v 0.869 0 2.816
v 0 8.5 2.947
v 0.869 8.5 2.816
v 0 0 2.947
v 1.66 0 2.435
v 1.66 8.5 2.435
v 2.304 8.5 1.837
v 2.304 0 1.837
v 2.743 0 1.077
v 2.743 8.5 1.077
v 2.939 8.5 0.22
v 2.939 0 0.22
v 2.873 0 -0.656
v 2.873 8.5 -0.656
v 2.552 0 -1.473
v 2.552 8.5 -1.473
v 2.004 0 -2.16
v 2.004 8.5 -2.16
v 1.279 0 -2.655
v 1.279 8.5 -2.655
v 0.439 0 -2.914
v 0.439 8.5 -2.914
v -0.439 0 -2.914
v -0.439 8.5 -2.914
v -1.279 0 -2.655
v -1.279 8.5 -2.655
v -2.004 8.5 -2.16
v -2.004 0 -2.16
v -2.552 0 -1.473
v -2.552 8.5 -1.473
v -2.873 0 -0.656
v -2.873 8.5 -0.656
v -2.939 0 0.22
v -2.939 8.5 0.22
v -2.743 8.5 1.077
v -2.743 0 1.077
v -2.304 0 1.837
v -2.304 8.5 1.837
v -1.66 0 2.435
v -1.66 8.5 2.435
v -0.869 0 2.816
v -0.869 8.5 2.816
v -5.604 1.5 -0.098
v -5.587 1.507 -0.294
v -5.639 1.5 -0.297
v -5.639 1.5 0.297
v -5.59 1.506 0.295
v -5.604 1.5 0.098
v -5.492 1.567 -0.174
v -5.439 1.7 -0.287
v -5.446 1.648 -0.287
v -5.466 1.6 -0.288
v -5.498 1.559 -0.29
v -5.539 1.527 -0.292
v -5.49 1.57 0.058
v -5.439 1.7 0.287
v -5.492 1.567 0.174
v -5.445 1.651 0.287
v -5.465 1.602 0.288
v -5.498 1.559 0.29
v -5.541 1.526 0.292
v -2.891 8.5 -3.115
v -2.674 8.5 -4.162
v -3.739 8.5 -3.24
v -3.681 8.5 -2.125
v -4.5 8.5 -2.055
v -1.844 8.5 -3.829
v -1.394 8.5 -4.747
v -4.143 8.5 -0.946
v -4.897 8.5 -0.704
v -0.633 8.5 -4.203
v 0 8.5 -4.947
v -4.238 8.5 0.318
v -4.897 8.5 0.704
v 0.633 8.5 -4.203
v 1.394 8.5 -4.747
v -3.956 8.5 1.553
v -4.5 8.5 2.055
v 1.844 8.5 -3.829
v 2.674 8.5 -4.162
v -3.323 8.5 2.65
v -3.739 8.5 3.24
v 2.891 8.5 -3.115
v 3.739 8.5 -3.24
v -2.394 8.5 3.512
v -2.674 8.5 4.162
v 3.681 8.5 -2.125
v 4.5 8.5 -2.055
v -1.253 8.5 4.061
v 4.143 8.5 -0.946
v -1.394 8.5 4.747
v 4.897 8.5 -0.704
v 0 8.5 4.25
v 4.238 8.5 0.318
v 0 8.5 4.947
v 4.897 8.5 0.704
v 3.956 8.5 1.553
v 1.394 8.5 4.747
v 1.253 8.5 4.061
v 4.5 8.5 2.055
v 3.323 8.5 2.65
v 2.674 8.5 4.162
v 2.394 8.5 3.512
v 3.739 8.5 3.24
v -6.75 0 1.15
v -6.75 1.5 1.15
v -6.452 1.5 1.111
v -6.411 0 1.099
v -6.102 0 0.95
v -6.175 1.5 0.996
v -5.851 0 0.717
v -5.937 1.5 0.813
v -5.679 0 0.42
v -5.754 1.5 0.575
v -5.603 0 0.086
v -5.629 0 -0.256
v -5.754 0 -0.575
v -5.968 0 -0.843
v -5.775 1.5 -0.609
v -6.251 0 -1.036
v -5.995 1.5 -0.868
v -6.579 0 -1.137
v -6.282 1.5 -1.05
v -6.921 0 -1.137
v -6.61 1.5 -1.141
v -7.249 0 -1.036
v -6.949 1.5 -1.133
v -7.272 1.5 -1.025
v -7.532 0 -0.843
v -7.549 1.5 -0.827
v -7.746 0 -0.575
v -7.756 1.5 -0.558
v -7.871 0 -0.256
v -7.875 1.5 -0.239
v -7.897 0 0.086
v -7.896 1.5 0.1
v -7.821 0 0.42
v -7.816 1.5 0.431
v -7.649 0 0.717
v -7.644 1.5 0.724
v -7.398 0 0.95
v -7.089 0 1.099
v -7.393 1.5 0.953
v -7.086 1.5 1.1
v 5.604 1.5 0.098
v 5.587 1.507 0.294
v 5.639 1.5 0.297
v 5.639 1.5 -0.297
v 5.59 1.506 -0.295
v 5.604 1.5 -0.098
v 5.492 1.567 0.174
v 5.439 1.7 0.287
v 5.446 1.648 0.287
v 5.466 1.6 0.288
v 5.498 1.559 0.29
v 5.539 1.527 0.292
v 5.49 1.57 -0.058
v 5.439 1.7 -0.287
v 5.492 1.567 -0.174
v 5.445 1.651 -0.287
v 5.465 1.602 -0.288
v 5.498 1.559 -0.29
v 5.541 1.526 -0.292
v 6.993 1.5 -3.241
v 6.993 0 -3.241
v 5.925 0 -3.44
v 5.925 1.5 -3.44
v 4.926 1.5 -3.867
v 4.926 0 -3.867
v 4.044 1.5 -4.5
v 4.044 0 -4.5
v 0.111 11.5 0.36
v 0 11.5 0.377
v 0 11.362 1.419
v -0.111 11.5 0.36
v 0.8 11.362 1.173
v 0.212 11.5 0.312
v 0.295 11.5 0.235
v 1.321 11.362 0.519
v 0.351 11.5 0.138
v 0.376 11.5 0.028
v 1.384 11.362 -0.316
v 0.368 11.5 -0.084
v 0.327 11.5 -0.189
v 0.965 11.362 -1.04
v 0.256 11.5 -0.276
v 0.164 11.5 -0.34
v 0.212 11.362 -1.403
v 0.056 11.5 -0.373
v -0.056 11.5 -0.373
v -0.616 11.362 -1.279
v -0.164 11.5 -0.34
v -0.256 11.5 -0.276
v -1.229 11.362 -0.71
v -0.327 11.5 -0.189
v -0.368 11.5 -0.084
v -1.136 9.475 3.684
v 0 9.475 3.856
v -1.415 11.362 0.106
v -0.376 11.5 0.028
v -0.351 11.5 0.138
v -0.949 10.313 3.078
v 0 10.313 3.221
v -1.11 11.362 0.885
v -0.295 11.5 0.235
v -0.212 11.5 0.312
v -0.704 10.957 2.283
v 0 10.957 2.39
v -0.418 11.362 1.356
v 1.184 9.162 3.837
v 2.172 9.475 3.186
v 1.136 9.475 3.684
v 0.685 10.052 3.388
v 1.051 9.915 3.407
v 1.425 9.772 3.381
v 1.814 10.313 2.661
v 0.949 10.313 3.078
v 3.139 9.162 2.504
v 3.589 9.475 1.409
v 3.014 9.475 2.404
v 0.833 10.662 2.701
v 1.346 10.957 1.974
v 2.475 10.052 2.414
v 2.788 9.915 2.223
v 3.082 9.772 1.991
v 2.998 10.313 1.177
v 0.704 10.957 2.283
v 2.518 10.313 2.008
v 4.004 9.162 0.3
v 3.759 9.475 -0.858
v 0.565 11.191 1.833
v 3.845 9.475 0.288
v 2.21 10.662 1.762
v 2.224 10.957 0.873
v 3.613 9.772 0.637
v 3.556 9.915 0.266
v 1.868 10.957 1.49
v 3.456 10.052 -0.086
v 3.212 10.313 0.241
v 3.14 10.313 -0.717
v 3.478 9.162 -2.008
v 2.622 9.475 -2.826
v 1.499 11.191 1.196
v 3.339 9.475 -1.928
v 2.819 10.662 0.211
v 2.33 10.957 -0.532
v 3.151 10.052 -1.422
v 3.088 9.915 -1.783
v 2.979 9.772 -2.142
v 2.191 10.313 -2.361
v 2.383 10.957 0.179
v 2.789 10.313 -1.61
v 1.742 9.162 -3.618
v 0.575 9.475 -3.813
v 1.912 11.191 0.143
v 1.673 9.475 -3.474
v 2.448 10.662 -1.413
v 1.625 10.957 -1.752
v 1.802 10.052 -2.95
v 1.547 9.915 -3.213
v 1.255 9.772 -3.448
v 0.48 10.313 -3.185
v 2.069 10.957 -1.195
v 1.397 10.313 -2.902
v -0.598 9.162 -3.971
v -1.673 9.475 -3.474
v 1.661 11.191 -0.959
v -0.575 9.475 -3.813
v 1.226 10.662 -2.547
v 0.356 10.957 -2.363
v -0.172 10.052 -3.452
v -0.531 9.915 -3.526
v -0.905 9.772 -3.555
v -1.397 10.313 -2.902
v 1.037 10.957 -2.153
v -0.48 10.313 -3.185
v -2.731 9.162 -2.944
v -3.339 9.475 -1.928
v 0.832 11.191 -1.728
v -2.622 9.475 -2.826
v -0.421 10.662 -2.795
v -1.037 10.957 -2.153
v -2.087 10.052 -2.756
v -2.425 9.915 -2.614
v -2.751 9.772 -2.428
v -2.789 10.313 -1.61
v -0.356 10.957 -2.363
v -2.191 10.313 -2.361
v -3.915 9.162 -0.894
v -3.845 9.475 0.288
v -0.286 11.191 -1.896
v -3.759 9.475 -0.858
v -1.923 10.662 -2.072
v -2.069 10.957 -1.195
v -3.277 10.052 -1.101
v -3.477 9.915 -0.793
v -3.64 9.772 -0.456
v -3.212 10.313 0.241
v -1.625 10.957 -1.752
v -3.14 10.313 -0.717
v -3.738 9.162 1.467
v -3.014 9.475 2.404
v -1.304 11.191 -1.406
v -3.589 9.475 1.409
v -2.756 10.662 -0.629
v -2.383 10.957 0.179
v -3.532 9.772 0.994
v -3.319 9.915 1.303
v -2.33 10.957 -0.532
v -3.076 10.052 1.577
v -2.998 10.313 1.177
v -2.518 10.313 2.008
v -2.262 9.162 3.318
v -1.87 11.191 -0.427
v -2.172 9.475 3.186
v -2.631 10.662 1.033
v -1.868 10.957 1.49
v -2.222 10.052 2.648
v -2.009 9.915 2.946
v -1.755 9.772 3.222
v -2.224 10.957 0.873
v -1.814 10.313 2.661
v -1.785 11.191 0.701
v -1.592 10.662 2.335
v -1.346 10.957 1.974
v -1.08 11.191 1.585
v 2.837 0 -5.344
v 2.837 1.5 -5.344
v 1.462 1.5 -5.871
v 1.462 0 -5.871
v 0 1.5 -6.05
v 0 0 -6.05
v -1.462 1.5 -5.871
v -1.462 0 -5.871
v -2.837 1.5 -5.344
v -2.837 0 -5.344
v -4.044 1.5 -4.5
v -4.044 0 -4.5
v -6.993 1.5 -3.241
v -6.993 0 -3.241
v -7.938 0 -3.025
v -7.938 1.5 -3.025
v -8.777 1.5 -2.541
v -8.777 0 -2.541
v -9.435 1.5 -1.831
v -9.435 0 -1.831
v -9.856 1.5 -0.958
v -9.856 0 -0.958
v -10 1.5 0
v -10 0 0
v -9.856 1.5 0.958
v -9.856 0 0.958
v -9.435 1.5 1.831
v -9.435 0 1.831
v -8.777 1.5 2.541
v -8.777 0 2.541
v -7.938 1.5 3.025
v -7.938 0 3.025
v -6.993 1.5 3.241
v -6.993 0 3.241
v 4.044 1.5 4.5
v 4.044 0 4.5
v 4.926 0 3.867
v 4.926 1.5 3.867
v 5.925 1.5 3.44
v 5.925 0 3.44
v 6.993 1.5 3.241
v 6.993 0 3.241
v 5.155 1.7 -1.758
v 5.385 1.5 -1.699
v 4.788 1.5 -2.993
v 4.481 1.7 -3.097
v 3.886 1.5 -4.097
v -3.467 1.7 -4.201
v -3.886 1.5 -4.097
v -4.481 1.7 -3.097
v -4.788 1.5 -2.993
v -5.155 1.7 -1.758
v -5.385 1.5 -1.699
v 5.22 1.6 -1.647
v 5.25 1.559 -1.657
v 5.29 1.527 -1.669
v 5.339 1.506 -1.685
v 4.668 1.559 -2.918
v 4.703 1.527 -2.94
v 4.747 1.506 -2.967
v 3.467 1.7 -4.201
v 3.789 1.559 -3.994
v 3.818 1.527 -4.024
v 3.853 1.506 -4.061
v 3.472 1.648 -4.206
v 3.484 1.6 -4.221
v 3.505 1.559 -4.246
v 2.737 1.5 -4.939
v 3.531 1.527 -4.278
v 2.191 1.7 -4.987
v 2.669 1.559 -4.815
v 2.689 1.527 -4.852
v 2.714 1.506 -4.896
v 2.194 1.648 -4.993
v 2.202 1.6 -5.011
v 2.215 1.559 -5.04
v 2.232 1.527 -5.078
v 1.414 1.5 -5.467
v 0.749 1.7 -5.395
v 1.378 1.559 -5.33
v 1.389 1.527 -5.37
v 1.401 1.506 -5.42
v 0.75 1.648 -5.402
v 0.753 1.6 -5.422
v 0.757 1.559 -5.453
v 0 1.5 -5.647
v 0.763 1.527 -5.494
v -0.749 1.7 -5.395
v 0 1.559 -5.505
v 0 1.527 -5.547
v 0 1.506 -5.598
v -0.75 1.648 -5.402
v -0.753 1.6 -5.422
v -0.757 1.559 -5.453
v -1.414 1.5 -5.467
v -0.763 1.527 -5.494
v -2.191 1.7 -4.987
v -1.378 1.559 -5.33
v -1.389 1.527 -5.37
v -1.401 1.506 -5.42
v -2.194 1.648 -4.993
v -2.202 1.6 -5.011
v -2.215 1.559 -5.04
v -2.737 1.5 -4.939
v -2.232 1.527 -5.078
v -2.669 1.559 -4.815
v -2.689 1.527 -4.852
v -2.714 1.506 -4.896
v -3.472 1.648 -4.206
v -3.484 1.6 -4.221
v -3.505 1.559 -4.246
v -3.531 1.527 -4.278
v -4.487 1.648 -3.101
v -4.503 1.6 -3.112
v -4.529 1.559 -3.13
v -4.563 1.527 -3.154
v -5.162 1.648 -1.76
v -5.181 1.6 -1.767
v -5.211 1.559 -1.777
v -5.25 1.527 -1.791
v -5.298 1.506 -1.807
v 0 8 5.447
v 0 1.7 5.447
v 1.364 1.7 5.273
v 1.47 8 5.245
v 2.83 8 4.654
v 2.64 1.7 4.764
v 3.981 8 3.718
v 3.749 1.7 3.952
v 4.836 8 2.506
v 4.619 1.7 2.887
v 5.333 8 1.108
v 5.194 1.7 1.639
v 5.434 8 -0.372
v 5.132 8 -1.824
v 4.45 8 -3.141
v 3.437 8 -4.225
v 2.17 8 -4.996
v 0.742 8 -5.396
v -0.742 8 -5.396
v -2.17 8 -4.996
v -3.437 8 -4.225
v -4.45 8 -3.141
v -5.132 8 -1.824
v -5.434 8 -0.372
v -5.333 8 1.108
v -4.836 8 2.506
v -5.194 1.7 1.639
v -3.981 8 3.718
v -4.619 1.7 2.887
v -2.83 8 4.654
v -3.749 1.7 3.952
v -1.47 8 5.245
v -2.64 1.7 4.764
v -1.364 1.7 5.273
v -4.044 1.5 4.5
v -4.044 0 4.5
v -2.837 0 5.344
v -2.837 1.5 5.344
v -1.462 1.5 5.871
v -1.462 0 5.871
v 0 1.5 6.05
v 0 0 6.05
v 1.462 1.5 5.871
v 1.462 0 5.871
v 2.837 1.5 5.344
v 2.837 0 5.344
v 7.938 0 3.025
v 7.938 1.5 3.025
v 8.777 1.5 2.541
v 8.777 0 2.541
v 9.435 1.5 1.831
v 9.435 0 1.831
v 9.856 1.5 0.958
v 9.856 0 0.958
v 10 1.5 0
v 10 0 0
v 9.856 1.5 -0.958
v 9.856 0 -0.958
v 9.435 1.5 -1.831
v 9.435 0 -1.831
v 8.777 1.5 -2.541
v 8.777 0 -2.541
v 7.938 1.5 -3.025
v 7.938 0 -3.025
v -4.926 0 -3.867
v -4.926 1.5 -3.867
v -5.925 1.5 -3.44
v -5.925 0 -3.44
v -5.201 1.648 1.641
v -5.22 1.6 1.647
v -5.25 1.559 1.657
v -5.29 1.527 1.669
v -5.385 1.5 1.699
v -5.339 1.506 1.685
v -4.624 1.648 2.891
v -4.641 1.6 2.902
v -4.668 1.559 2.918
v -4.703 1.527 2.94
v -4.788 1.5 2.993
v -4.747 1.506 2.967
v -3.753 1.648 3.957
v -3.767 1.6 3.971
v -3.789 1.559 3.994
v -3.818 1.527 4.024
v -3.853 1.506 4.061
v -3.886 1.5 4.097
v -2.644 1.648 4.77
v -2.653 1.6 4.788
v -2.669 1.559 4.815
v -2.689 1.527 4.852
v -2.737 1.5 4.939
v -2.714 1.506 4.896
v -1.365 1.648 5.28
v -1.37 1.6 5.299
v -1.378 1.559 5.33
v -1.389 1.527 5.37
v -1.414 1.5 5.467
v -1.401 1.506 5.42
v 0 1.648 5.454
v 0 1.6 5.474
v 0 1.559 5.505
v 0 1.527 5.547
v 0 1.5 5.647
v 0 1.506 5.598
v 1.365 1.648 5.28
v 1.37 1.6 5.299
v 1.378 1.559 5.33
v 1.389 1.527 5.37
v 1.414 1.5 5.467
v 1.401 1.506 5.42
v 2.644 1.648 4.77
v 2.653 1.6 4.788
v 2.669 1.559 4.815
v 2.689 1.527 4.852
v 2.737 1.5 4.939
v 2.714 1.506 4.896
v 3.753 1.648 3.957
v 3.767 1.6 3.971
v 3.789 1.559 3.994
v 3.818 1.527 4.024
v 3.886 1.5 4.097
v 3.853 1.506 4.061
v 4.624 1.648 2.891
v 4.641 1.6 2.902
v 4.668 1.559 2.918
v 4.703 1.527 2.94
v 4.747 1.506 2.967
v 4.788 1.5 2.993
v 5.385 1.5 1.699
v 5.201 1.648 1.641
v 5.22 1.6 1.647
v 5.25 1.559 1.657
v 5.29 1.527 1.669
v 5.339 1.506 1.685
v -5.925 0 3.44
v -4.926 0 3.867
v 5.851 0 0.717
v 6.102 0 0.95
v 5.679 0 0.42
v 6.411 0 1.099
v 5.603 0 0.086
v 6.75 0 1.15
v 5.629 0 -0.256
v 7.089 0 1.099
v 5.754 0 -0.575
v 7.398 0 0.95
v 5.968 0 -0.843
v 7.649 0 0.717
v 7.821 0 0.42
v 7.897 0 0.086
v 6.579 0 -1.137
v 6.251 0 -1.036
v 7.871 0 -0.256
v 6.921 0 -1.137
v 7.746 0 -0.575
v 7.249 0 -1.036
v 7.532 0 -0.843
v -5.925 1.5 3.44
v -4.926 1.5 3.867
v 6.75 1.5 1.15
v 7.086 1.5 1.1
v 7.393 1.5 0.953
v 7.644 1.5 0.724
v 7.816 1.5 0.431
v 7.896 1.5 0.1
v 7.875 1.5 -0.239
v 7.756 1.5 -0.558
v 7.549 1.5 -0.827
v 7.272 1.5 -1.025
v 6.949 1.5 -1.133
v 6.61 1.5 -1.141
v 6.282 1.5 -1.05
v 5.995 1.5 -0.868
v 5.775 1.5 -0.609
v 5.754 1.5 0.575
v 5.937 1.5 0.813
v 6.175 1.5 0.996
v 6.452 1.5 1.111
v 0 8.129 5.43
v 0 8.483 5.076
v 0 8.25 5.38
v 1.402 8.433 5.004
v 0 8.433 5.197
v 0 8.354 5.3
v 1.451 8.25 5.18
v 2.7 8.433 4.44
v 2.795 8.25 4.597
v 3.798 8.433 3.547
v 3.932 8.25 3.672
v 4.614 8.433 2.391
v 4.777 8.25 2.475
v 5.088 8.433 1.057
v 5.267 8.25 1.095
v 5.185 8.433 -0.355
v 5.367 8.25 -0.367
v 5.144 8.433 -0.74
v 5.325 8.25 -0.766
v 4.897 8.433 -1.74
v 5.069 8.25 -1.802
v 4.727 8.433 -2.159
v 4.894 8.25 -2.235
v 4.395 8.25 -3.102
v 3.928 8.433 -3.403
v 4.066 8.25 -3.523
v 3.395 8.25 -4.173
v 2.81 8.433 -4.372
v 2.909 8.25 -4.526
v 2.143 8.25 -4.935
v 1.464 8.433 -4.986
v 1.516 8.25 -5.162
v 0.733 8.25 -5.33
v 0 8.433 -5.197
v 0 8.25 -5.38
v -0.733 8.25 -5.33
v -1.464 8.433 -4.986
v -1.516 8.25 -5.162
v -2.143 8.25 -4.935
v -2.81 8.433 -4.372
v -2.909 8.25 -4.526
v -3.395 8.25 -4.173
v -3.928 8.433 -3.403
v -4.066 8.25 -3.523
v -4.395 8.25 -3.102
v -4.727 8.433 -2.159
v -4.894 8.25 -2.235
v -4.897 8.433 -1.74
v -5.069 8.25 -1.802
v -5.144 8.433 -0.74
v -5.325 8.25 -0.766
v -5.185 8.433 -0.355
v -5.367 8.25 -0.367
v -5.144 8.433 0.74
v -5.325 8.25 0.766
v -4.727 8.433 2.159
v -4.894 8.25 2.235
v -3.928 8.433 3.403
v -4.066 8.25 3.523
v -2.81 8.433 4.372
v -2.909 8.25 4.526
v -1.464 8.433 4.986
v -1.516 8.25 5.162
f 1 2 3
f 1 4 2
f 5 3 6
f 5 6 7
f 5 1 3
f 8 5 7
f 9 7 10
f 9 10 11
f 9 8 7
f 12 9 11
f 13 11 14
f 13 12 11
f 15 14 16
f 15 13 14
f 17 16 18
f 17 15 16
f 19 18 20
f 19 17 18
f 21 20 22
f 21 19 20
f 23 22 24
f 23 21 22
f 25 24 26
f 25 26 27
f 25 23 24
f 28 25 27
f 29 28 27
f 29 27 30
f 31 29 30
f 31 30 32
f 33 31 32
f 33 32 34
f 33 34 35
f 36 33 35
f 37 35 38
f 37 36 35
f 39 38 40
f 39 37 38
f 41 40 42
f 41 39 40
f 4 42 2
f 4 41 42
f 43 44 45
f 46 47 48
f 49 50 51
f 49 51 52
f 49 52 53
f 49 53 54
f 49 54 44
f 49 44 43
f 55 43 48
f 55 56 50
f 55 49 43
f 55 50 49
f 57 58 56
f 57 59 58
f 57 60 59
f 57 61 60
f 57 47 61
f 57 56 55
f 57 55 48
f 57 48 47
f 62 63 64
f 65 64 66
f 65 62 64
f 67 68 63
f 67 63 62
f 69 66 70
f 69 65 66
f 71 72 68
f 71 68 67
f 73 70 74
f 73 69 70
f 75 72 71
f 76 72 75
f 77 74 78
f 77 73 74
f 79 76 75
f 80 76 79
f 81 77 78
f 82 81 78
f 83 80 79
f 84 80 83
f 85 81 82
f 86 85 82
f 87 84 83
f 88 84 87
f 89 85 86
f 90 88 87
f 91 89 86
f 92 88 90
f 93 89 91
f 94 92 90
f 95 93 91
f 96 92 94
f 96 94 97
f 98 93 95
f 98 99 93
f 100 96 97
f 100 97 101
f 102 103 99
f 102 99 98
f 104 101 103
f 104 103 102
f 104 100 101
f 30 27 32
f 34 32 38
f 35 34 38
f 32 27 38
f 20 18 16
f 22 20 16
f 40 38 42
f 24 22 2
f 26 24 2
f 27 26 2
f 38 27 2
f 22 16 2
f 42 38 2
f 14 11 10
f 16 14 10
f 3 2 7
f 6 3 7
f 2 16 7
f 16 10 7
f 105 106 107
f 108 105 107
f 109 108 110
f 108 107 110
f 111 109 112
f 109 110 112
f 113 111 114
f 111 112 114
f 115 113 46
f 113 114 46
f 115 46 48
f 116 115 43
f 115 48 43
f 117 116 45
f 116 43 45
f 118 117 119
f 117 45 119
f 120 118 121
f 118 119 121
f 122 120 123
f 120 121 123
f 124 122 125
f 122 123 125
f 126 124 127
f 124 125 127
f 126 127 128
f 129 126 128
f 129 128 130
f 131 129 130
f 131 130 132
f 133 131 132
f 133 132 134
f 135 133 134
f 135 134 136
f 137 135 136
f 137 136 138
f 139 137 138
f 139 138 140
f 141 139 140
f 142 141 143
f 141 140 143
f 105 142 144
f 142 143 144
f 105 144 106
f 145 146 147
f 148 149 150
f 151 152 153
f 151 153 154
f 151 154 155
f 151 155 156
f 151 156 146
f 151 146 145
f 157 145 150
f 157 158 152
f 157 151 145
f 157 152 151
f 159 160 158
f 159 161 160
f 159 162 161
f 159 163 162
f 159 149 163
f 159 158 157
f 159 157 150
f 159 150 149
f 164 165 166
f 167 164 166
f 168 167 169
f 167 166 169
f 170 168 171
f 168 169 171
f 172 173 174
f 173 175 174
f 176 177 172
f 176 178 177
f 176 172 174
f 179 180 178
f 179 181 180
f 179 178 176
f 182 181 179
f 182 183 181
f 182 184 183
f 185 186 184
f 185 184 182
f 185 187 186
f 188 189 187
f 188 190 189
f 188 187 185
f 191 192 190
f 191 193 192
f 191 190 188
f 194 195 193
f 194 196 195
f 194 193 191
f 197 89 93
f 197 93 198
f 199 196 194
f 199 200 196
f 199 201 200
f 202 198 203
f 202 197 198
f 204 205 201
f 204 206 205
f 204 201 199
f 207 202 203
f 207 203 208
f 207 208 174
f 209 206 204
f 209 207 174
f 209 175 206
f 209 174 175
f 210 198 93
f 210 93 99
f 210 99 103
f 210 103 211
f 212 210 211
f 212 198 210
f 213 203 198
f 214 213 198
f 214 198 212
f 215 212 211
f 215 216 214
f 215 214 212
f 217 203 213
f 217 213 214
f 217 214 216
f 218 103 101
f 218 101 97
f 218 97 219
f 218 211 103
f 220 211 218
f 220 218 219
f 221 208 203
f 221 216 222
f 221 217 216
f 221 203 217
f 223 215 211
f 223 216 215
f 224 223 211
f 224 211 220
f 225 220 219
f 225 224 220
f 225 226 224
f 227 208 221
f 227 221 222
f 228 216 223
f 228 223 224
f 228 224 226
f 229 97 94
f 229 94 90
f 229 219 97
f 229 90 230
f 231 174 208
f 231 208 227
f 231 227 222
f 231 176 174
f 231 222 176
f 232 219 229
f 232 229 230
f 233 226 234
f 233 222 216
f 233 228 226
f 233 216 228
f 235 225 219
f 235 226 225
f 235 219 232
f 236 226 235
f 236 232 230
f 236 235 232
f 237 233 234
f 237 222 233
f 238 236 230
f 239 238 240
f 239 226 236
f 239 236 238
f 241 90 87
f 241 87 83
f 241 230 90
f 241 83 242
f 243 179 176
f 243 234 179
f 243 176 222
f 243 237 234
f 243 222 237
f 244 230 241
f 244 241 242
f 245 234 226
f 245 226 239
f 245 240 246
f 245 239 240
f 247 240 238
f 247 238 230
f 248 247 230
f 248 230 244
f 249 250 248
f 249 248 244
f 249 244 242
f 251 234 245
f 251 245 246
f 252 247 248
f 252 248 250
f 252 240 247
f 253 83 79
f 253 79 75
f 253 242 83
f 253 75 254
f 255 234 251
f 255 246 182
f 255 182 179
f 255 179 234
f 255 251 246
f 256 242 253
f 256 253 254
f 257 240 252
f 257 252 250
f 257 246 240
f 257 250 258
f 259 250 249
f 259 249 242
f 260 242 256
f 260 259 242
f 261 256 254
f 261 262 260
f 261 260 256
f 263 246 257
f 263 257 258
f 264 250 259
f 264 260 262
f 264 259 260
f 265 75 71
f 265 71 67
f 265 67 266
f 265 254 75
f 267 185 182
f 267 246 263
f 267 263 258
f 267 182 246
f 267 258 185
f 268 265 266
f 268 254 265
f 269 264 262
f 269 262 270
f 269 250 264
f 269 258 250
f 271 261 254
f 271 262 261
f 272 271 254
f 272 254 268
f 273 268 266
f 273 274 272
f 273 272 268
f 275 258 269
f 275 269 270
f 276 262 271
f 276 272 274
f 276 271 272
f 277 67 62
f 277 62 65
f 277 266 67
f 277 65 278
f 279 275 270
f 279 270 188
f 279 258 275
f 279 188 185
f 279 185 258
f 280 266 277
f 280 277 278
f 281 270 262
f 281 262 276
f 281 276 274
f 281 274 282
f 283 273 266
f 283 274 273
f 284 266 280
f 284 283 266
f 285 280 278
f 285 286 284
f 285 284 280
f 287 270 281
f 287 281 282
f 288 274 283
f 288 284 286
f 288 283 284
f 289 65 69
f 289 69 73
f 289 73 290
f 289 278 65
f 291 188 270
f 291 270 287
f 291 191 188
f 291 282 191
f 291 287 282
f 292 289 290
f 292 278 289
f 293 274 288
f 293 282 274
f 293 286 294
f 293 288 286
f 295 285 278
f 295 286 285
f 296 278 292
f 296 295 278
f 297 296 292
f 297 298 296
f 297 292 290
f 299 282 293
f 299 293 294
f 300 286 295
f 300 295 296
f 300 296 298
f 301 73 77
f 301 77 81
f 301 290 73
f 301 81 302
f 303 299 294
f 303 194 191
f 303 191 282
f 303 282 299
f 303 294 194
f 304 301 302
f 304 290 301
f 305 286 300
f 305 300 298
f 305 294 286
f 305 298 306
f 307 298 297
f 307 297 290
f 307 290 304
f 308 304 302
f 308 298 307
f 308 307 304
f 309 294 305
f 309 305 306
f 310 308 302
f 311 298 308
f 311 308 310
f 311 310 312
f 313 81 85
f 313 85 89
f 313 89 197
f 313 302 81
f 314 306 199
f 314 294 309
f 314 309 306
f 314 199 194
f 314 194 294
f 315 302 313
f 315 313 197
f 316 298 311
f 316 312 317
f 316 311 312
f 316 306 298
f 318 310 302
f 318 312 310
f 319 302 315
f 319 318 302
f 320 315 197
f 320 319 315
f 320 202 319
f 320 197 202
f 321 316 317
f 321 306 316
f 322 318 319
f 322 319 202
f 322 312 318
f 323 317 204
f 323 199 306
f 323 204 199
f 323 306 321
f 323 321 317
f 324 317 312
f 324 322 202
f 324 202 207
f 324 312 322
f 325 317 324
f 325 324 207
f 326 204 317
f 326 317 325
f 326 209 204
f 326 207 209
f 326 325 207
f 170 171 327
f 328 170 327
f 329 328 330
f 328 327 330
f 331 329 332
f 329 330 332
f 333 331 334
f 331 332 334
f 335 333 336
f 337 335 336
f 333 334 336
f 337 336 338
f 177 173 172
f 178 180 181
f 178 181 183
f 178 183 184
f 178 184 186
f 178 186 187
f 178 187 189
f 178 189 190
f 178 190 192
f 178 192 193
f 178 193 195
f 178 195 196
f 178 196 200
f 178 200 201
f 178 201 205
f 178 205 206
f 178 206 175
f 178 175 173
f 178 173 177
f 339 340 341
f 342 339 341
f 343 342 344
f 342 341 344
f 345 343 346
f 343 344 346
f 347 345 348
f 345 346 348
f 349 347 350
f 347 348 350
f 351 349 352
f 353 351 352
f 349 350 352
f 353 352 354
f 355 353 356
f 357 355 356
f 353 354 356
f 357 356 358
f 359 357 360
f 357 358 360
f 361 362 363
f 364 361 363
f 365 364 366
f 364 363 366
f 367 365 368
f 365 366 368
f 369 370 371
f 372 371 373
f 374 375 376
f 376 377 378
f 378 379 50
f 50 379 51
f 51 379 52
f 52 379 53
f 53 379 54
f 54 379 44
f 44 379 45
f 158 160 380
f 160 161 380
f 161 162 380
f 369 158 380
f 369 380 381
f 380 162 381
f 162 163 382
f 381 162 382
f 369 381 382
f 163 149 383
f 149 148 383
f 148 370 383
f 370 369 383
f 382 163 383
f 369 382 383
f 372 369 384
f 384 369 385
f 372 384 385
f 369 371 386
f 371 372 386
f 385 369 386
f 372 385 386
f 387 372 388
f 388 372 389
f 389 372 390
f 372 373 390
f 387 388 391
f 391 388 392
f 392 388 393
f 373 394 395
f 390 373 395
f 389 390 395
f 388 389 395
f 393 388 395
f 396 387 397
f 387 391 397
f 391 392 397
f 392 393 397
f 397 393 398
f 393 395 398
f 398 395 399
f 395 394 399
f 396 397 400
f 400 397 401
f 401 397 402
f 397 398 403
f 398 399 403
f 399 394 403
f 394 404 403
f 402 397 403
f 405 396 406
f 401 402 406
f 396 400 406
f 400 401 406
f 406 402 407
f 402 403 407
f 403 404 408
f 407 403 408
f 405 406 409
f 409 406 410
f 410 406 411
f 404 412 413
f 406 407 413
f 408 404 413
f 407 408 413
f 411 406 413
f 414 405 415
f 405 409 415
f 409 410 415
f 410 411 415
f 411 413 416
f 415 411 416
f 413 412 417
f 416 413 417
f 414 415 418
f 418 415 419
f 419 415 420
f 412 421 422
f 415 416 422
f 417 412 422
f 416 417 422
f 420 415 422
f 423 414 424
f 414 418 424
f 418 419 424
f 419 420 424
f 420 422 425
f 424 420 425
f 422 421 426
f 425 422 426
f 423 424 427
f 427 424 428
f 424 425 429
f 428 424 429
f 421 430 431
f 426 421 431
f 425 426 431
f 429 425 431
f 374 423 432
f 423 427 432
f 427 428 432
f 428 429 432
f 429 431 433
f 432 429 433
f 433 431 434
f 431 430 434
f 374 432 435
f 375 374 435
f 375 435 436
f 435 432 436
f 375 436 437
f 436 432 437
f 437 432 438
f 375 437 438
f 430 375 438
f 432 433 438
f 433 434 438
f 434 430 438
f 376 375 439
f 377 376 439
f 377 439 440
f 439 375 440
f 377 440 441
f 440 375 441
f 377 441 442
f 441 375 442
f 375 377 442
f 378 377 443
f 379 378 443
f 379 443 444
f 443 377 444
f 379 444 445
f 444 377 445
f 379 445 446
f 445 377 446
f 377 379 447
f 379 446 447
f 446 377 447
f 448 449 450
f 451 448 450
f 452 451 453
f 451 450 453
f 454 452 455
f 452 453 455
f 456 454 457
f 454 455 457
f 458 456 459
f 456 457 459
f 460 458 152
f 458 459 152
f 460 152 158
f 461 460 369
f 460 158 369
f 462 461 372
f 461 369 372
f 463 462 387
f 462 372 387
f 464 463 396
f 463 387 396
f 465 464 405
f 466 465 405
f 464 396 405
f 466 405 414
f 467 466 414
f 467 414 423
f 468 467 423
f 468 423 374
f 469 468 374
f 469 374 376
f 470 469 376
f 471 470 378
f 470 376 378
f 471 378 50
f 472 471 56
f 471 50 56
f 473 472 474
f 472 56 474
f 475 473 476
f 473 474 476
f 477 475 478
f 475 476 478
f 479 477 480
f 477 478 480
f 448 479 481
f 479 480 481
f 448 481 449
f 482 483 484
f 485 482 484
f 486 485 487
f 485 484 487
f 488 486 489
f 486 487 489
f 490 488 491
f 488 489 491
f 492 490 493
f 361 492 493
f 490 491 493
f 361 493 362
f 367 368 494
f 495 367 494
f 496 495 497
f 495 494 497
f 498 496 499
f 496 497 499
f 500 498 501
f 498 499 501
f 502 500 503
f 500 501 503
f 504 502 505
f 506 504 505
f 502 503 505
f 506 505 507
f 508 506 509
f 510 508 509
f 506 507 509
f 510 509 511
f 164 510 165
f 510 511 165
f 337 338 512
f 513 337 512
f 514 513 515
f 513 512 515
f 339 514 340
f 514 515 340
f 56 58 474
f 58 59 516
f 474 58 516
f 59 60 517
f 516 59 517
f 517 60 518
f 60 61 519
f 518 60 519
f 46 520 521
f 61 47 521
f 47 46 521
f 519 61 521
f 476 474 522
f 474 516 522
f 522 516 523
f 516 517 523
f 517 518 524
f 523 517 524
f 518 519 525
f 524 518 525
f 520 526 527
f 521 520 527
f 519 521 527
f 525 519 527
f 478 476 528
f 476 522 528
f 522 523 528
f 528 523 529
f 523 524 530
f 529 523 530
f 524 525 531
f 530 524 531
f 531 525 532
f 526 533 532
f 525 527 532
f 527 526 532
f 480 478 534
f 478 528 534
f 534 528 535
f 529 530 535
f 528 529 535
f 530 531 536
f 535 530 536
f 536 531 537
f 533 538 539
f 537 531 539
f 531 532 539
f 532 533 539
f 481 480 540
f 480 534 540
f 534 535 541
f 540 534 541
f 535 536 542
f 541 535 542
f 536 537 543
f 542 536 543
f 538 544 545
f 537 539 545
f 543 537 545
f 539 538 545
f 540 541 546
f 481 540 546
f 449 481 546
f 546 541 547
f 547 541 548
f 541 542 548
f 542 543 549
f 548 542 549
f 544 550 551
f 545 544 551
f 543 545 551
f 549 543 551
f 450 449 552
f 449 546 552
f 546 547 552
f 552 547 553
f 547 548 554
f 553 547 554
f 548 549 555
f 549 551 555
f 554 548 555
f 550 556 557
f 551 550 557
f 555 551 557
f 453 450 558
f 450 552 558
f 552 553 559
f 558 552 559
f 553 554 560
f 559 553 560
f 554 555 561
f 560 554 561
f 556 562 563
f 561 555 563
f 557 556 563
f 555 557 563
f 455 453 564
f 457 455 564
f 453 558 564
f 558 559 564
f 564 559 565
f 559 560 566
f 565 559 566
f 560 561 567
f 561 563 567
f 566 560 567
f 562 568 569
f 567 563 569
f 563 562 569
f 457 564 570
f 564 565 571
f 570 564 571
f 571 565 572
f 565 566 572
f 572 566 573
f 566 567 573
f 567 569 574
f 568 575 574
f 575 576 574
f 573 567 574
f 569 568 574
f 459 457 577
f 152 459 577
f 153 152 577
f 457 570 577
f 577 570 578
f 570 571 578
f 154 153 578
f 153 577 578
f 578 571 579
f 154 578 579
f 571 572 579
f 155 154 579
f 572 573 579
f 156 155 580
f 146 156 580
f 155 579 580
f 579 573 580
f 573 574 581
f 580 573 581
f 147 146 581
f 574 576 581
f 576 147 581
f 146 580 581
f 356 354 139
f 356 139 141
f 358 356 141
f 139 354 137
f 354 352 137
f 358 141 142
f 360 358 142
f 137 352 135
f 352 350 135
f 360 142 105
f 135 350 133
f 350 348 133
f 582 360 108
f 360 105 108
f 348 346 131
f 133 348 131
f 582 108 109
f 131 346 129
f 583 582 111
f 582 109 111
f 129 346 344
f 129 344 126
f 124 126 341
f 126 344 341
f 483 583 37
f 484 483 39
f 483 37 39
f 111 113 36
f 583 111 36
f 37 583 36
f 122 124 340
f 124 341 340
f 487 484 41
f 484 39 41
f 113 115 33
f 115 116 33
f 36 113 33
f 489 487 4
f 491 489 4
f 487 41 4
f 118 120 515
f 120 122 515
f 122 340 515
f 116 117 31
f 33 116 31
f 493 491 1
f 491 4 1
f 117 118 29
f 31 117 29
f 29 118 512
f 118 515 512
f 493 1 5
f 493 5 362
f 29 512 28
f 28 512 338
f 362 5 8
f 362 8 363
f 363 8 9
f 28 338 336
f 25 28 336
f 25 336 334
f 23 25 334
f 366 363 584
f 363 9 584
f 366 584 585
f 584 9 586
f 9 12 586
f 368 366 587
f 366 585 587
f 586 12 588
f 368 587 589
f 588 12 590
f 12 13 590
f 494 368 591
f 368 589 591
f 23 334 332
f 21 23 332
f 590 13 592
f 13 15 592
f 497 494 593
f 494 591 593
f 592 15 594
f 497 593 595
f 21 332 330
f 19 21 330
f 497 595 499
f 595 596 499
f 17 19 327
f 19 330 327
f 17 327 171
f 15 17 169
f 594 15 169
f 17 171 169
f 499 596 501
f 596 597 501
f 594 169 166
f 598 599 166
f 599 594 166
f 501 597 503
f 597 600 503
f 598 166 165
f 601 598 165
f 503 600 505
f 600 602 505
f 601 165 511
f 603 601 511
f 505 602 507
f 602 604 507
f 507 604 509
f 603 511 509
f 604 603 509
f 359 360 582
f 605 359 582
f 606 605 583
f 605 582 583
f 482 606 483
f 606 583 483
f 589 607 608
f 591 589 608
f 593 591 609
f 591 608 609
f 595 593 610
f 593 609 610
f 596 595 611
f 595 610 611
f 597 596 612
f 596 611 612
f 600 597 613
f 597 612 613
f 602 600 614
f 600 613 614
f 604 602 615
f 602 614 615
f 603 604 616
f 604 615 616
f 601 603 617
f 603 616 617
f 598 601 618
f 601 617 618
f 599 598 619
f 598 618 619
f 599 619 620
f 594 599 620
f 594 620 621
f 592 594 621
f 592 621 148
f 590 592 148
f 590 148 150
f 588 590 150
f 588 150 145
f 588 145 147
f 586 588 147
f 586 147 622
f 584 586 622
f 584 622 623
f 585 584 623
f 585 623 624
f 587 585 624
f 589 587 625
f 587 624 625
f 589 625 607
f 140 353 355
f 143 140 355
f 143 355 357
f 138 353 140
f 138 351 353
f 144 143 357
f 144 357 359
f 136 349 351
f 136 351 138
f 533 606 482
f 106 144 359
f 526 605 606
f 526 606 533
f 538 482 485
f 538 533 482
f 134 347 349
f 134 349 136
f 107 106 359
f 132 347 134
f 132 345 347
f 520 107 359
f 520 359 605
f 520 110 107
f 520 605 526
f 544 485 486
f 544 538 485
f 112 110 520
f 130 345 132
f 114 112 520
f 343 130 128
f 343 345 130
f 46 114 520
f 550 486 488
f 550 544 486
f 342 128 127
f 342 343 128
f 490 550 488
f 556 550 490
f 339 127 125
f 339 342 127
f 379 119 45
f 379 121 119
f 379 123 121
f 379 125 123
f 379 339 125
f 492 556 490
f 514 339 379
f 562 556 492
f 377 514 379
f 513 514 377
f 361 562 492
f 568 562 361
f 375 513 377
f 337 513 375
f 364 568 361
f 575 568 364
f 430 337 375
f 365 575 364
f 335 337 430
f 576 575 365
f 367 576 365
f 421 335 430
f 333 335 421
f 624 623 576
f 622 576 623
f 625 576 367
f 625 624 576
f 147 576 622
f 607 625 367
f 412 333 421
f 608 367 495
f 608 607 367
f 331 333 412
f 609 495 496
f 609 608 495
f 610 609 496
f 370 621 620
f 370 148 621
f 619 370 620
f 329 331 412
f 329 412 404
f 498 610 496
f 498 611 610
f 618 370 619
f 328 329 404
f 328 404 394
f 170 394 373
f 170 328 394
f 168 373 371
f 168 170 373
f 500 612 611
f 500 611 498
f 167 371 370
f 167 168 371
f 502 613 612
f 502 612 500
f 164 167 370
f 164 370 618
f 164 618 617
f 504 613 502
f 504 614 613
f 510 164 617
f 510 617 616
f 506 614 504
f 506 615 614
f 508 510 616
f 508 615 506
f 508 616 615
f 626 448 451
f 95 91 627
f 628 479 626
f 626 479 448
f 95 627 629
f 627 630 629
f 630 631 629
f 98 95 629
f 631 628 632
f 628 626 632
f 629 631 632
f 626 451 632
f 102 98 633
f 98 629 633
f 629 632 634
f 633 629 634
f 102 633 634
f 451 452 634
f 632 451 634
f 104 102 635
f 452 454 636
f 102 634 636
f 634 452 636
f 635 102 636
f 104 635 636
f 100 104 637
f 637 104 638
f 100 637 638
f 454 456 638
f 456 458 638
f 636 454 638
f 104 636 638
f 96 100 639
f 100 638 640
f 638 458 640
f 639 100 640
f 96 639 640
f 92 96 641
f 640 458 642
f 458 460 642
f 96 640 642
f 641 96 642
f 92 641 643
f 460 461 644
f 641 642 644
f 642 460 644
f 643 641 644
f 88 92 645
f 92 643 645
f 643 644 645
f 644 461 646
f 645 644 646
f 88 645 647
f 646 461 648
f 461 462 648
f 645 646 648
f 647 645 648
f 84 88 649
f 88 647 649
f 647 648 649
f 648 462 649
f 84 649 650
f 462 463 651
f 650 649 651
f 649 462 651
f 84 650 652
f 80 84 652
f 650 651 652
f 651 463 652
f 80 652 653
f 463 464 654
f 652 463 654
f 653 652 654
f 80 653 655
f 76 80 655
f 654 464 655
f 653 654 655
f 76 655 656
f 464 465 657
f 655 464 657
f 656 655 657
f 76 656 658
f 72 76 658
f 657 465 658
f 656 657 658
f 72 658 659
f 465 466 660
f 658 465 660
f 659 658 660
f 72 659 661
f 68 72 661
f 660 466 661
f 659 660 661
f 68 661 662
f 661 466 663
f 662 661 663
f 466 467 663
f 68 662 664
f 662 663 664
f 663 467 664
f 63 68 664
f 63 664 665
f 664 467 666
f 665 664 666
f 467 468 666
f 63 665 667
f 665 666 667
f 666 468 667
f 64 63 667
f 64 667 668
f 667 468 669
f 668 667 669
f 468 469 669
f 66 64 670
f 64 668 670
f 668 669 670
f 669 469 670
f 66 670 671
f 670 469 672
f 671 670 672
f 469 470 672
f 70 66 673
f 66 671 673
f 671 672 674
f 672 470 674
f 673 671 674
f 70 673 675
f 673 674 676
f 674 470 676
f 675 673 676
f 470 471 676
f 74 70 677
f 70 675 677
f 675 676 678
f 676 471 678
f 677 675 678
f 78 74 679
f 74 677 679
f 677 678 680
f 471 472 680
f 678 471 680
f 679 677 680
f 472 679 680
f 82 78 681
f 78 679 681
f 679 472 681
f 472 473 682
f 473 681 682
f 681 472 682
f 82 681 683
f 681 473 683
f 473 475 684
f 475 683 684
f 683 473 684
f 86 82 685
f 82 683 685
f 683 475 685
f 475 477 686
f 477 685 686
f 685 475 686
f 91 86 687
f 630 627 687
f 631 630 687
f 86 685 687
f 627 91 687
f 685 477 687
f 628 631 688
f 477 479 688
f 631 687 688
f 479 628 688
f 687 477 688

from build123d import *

# Parameters (mm, degrees)
SKETCH1_R           = 2.946896199
BOSS_EXTRUDE1_DEPTH = 1.5
SKETCH2_R           = 1.15
CUT_EXTRUDE1_DEPTH  = 1.5
SKETCH3_R           = 5.446896199
SKETCH3_R_2         = 2.946896199
BOSS_EXTRUDE2_DEPTH = 7
SKETCH4_R           = 4.25
BOSS_EXTRUDE3_DEPTH = 3
FILLET1_R           = 4
FILLET2_R           = 0.5
FILLET3_R           = 0.2


with BuildPart() as part:
    # Sketch1 → Boss-Extrude1 (new body)
    with BuildSketch(Plane(origin=(0, 0, 0), x_dir=(1, 0, 0), z_dir=(0, 1, 0))):
        with BuildLine():
            ThreePointArc((-4.043822449, -4.5), (0, -6.05), (4.043822449, -4.5))
            ThreePointArc((4.043822449, -4.5), (5.414156345, -3.625965374), (6.993227337, -3.240885753))
            ThreePointArc((6.993227337, -3.240885753), (10, 0), (6.993227337, 3.240885753))
            ThreePointArc((6.993227337, 3.240885753), (5.414156345, 3.625965374), (4.043822449, 4.5))
            ThreePointArc((4.043822449, 4.5), (0, 6.05), (-4.043822449, 4.5))
            ThreePointArc((-4.043822449, 4.5), (-5.414156345, 3.625965374), (-6.993227337, 3.240885753))
            ThreePointArc((-6.993227337, 3.240885753), (-10, 0), (-6.993227337, -3.240885753))
            ThreePointArc((-6.993227337, -3.240885753), (-5.414156345, -3.625965374), (-4.043822449, -4.5))
        make_face()
        with Locations(Location((0, 0, 0), (0, 0, 270))):
            Circle(SKETCH1_R, mode=Mode.SUBTRACT)
    extrude(amount=BOSS_EXTRUDE1_DEPTH)

    # Sketch2 → Cut-Extrude1 (cut)
    with BuildSketch(Plane(origin=(0, 1.5, 0), x_dir=(1, 0, 0), z_dir=(0, 1, 0))):
        with Locations(Location((-6.75, 0, 0), (0, 0, 270))):
            Circle(SKETCH2_R)
        with Locations(Location((6.75, 0, 0), (0, 0, 270))):
            Circle(SKETCH2_R)
    extrude(amount=-CUT_EXTRUDE1_DEPTH, mode=Mode.SUBTRACT)

    # Sketch3 → Boss-Extrude2 (add)
    with BuildSketch(Plane(origin=(0, 1.5, 0), x_dir=(1, 0, 0), z_dir=(0, 1, 0))):
        with Locations(Location((0, 0, 0), (0, 0, 270))):
            Circle(SKETCH3_R)
        with Locations(Location((0, 0, 0), (0, 0, 270))):
            Circle(SKETCH3_R_2, mode=Mode.SUBTRACT)
    extrude(amount=BOSS_EXTRUDE2_DEPTH)

    # Sketch4 → Boss-Extrude3 (add)
    with BuildSketch(Plane(origin=(0, 8.5, 0), x_dir=(1, 0, 0), z_dir=(0, 1, 0))):
        with Locations(Location((0, 0, 0), (0, 0, 270))):
            Circle(SKETCH4_R)
    extrude(amount=BOSS_EXTRUDE3_DEPTH)

    # Fillet1
    # the kernel refuses this fillet: 4 mm, written as the material it takes off along each edge
    with BuildSketch(Plane(origin=(0, 11.5, 0), x_dir=(0, 0, 1), z_dir=(-1, 0, 0))) as fillet1_piece_1:
        with BuildLine():
            CenterArc((0.377016654, -4), FILLET1_R, 14.477512186, 75.522487814)
            Line((0.377016654, 0), (0.377016654, 0.08))
            Line((0.377016654, 0.08), (4.25, 0.08))
            Line((4.25, 0.08), (4.33, 0))
            ThreePointArc((4.33, 0), (4.33, -1.5), (4.327459667, -2.98))
            Line((4.327459667, -2.98), (4.25, -3))
        make_face()
    revolve(axis=Axis((0, 11.5, 0), (0, 1, 0)), mode=Mode.SUBTRACT)

    # Fillet2
    fillet2_edges = [part.edges().sort_by_distance(p)[0] for p in [
        (0, 8.5, -5.446896199),
    ]]
    fillet(fillet2_edges, radius=FILLET2_R)

    # Fillet3
    fillet3_edges = [part.edges().sort_by_distance(p)[0] for p in [
        (0, 1.5, -5.446896199),
    ]]
    fillet(fillet3_edges, radius=FILLET3_R)


solid = part.part
